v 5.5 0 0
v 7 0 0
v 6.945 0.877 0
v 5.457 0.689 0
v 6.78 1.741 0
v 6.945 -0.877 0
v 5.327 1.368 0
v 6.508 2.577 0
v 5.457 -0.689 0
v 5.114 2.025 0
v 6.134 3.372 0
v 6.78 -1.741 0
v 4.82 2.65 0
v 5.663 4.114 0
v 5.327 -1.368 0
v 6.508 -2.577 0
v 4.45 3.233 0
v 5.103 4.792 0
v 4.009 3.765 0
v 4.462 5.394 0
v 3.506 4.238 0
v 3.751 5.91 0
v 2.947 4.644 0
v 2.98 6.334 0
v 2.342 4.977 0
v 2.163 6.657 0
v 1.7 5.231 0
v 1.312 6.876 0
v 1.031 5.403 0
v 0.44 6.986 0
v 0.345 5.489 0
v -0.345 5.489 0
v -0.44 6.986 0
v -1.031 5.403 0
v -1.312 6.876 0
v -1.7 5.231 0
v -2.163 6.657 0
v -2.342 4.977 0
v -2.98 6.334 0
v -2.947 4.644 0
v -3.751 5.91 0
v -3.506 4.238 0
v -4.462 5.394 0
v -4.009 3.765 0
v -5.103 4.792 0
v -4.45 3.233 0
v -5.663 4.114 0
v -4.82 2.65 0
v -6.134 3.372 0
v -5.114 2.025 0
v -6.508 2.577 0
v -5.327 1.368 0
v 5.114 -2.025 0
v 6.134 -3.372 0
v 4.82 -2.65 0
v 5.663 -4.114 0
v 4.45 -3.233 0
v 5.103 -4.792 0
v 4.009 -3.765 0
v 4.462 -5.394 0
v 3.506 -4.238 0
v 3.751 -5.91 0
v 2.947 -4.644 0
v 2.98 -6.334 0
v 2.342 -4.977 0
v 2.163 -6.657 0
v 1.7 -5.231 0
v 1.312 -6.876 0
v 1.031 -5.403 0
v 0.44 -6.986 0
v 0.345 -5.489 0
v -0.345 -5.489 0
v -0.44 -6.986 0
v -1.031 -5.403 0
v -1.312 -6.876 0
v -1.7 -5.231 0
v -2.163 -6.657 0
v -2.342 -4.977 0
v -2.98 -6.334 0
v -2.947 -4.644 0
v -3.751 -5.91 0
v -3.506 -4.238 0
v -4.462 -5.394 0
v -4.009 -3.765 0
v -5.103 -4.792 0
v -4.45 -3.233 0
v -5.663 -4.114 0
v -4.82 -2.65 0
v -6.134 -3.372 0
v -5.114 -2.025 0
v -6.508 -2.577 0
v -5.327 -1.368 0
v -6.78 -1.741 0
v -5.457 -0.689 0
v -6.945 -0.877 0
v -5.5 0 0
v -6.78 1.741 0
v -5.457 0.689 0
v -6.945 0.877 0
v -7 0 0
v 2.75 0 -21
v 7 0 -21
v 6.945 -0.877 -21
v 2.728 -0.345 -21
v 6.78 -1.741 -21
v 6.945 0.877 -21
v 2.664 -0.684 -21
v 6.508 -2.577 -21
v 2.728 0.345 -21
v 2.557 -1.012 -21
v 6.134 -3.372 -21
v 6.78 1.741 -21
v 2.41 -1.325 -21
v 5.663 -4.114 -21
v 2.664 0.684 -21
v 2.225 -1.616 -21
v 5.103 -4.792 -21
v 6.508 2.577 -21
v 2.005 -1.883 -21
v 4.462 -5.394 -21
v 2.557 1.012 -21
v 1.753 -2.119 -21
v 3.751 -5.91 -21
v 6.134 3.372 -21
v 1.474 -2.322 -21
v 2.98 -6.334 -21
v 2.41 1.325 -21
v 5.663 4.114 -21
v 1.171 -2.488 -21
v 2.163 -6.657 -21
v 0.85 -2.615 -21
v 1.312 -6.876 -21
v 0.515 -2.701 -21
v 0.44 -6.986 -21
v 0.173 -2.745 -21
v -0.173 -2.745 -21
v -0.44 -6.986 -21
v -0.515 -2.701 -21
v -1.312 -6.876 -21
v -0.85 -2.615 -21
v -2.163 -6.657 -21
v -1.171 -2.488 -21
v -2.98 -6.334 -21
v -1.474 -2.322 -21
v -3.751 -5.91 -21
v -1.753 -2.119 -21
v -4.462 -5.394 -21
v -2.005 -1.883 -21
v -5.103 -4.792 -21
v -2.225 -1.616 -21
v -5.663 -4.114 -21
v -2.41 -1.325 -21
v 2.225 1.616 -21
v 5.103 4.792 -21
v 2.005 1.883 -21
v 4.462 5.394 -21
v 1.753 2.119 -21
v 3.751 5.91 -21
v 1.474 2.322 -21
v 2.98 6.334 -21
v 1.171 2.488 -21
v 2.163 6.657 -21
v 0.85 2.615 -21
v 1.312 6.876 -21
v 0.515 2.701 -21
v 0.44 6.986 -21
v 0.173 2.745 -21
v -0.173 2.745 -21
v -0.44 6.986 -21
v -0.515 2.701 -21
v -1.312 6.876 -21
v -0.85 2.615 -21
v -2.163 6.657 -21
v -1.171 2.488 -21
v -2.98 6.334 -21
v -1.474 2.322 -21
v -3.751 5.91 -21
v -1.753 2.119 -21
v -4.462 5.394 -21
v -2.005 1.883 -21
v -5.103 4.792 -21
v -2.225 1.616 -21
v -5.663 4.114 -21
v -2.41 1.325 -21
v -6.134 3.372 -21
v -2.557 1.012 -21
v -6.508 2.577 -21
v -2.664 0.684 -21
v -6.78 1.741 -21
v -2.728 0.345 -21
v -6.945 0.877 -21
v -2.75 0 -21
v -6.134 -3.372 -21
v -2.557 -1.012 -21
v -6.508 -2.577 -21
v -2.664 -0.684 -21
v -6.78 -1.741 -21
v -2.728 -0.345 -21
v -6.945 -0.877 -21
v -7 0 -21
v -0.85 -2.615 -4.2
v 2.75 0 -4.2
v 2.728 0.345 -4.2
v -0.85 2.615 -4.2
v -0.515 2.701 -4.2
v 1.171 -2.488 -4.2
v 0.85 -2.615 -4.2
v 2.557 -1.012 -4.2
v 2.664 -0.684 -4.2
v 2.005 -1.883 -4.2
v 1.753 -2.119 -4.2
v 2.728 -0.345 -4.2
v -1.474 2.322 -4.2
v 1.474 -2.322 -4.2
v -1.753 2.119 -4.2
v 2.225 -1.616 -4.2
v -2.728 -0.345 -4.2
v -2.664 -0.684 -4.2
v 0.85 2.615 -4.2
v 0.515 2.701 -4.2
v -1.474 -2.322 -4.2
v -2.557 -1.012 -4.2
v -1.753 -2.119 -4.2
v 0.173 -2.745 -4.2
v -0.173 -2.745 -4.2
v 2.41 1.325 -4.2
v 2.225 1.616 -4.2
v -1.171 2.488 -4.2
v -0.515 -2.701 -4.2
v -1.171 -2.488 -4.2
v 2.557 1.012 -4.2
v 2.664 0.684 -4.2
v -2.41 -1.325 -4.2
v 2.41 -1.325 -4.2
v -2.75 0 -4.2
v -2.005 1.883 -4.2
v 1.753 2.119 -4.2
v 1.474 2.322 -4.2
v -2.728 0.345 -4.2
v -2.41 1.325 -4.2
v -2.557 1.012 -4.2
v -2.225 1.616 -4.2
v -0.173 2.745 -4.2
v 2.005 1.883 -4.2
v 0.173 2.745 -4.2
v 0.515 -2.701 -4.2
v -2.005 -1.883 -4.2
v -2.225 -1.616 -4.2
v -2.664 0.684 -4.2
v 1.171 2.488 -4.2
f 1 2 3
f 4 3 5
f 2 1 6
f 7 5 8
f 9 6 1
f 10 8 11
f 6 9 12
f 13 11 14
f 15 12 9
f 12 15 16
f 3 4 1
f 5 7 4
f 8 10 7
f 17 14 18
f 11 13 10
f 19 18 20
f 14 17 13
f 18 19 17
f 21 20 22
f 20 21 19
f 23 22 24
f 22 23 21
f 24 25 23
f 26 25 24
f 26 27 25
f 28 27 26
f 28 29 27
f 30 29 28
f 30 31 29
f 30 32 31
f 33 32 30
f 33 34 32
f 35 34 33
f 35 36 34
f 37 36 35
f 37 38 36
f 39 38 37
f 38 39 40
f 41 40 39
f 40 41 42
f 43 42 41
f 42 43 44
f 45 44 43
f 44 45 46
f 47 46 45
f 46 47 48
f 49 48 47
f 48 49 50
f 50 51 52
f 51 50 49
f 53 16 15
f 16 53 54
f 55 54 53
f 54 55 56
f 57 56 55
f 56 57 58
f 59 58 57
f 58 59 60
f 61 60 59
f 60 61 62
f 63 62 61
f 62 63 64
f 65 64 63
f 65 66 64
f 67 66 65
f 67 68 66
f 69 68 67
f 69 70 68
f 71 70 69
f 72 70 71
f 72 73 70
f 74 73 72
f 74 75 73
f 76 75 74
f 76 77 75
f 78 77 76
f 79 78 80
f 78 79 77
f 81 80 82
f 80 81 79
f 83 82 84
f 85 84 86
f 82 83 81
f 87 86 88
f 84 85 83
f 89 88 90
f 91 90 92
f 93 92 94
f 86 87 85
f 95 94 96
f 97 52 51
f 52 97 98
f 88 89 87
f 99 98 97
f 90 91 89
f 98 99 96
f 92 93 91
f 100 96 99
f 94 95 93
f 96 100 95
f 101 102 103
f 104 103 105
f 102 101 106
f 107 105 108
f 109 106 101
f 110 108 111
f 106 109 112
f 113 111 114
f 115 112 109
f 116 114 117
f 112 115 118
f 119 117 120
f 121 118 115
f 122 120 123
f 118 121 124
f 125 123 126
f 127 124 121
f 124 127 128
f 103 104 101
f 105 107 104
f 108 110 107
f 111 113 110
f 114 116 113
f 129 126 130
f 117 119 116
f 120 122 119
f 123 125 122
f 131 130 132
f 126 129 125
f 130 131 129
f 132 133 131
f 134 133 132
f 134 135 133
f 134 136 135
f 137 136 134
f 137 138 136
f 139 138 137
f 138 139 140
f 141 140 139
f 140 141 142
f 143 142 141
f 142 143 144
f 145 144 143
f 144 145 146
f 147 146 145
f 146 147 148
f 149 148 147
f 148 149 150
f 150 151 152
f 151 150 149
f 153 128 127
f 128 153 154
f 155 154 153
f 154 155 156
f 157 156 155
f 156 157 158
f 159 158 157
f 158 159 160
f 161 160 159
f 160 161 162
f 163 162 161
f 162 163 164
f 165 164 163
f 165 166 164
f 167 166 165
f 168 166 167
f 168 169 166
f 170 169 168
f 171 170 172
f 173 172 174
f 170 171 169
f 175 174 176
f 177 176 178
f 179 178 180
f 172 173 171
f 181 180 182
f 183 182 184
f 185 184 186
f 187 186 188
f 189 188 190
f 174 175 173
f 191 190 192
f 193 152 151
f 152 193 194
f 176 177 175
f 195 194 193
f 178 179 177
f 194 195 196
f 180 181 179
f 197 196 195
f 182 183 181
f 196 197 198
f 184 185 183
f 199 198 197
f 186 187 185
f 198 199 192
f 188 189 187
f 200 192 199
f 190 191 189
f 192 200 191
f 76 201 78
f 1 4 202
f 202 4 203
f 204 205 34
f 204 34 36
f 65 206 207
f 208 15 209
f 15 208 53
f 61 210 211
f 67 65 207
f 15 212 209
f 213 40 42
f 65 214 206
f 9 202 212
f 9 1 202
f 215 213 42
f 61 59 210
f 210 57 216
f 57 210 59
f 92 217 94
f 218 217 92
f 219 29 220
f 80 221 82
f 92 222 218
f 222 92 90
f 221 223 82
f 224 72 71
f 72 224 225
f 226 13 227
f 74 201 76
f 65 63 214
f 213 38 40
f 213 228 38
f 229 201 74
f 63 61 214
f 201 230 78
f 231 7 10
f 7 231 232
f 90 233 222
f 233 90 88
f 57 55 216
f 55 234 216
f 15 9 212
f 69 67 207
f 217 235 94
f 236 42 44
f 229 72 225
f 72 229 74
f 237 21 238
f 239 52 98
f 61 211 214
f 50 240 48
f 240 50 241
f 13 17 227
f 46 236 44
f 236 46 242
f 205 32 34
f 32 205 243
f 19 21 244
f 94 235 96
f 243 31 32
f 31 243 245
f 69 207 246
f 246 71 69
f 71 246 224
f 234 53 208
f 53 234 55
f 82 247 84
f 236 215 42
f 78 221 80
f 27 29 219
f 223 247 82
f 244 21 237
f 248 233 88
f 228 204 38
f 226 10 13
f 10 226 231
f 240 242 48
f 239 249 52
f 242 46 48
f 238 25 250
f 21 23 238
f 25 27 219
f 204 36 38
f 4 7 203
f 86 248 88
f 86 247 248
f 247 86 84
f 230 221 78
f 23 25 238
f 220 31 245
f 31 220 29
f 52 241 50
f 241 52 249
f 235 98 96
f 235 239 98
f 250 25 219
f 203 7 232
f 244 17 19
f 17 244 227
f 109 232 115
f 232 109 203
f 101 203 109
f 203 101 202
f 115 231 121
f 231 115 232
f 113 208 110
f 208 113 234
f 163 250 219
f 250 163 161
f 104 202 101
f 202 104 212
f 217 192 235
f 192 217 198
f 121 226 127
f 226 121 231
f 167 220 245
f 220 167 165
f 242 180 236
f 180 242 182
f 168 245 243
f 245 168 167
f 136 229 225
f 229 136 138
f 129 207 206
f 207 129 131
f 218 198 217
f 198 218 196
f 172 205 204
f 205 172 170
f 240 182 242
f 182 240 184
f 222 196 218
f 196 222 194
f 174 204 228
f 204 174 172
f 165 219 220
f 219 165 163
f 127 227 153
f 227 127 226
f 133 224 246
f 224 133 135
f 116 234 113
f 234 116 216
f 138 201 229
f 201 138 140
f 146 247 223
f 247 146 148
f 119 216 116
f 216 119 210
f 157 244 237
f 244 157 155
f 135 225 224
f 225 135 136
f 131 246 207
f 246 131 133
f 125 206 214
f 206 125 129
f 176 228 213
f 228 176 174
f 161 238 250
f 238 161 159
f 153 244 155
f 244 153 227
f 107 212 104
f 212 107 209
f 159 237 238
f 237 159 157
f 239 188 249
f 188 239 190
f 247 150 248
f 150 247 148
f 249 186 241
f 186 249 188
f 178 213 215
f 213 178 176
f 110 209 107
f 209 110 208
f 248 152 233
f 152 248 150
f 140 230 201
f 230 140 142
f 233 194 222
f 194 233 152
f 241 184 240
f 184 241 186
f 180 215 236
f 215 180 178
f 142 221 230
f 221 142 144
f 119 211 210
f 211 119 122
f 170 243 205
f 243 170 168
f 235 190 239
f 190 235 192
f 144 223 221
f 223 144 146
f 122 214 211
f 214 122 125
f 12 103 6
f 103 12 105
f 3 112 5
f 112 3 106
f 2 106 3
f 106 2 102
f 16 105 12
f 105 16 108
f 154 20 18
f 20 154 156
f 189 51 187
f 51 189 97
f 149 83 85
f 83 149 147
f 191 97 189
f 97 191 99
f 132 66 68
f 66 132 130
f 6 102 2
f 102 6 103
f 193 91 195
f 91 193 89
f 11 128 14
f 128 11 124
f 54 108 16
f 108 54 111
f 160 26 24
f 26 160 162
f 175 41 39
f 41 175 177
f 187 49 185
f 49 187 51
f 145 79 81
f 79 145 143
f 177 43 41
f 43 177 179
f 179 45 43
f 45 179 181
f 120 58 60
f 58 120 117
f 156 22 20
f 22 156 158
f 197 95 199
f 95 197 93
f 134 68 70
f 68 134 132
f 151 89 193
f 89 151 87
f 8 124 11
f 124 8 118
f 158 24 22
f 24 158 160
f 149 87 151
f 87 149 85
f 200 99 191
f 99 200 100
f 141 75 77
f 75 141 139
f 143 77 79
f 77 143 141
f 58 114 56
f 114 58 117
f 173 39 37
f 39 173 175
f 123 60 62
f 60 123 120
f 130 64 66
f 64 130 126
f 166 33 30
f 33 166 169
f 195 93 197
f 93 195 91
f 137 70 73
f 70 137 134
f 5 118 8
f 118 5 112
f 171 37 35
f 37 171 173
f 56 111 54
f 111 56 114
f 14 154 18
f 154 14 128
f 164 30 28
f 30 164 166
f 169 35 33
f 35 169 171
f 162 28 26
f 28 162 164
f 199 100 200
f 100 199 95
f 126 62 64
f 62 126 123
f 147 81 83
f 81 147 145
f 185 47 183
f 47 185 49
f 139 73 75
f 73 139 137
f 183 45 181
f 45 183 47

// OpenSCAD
$fn = 50;


difference() {
	union() {
		translate(v = [0, 0, -21.0000000000]) {
			cylinder(h = 21, r = 7.0000000000);
		}
		cylinder(h = 0, r = 10.0000000000);
	}
	union() {
		translate(v = [0, 0, 0]) {
			rotate(a = [0, 0, 0]) {
				difference() {
					union() {
						#translate(v = [0, 0, -21.0000000000]) {
							cylinder(h = 21, r = 2.2500000000);
						}
						#translate(v = [0, 0, -4.2000000000]) {
							cylinder(h = 4.2000000000, r1 = 2.7500000000, r2 = 5.5000000000);
						}
						#translate(v = [0, 0, -21.0000000000]) {
							cylinder(h = 21, r = 2.7500000000);
						}
						#translate(v = [0, 0, -21.0000000000]) {
							cylinder(h = 21, r = 2.2500000000);
						}
					}
					union();
				}
			}
		}
	}
}
